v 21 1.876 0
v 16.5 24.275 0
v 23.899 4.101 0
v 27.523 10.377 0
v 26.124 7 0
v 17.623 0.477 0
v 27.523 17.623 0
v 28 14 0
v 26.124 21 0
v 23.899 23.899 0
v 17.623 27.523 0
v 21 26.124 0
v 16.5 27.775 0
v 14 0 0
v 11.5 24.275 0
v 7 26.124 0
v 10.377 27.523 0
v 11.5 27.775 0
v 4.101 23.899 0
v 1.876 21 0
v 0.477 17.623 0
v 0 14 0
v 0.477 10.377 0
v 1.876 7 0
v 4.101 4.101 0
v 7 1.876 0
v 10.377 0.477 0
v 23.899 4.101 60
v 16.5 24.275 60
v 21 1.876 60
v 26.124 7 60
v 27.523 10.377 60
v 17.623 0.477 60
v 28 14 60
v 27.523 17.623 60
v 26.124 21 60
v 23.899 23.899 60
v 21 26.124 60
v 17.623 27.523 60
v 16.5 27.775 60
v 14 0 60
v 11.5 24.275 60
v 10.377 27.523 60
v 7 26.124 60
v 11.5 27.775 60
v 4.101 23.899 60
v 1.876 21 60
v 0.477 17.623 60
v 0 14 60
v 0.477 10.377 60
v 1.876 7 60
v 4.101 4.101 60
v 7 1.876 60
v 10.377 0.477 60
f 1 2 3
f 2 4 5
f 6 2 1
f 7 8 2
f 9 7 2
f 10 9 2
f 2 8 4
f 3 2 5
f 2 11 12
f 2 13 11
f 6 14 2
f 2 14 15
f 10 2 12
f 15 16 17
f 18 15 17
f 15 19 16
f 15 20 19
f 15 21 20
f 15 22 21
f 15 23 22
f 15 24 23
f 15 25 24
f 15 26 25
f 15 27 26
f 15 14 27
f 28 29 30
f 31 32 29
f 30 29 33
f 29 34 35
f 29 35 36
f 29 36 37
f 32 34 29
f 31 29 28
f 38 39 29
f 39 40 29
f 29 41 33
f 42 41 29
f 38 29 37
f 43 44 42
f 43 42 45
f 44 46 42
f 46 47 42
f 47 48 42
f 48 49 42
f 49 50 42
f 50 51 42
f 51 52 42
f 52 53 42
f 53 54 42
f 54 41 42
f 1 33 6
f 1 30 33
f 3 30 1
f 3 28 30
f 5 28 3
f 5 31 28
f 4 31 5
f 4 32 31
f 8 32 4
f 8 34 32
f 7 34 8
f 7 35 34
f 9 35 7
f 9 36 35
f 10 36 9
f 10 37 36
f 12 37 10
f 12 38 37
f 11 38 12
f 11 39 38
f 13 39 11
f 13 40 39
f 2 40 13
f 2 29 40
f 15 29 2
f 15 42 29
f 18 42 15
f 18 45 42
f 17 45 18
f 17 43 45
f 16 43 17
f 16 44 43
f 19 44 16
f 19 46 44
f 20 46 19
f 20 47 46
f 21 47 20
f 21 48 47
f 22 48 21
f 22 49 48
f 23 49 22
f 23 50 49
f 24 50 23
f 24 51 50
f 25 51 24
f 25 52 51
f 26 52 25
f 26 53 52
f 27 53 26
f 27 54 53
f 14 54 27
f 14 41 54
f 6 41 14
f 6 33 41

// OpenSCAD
$fn = 32;

// ----------------------------------------------------------------------
// Keyway shaft: d28 shaft, key 5 x 3.5 mm
// ----------------------------------------------------------------------

// --- parameters (mm) ---
shaft_r = 14;             // shaft radius
key_w = 5;                // keyway width
key_d = 3.5;              // keyway depth below the surface line
plate_t = 60;             // shaft length, Z (extrusion height)

shaft_d = 2 * shaft_r;  // shaft diameter
circle_step = 15;  // polygon sampling step, degrees

profile = [[10.377, 27.523], [7, 26.124], [4.101, 23.899], [1.876, 21], [0.477, 17.623], [0, 14], [0.477, 10.377], [1.876, 7], [4.101, 4.101], [7, 1.876], [10.377, 0.477], [14, 0], [17.623, 0.477], [21, 1.876], [23.899, 4.101], [26.124, 7], [27.523, 10.377], [28, 14], [27.523, 17.623], [26.124, 21], [23.899, 23.899], [21, 26.124], [17.623, 27.523], [16.5, 27.775], [16.5, 24.275], [11.5, 24.275], [11.5, 27.775]];  // primary outline, 27 points, counter clockwise

// --- the one profile operation ---
linear_extrude(height = plate_t) polygon(points = profile);
